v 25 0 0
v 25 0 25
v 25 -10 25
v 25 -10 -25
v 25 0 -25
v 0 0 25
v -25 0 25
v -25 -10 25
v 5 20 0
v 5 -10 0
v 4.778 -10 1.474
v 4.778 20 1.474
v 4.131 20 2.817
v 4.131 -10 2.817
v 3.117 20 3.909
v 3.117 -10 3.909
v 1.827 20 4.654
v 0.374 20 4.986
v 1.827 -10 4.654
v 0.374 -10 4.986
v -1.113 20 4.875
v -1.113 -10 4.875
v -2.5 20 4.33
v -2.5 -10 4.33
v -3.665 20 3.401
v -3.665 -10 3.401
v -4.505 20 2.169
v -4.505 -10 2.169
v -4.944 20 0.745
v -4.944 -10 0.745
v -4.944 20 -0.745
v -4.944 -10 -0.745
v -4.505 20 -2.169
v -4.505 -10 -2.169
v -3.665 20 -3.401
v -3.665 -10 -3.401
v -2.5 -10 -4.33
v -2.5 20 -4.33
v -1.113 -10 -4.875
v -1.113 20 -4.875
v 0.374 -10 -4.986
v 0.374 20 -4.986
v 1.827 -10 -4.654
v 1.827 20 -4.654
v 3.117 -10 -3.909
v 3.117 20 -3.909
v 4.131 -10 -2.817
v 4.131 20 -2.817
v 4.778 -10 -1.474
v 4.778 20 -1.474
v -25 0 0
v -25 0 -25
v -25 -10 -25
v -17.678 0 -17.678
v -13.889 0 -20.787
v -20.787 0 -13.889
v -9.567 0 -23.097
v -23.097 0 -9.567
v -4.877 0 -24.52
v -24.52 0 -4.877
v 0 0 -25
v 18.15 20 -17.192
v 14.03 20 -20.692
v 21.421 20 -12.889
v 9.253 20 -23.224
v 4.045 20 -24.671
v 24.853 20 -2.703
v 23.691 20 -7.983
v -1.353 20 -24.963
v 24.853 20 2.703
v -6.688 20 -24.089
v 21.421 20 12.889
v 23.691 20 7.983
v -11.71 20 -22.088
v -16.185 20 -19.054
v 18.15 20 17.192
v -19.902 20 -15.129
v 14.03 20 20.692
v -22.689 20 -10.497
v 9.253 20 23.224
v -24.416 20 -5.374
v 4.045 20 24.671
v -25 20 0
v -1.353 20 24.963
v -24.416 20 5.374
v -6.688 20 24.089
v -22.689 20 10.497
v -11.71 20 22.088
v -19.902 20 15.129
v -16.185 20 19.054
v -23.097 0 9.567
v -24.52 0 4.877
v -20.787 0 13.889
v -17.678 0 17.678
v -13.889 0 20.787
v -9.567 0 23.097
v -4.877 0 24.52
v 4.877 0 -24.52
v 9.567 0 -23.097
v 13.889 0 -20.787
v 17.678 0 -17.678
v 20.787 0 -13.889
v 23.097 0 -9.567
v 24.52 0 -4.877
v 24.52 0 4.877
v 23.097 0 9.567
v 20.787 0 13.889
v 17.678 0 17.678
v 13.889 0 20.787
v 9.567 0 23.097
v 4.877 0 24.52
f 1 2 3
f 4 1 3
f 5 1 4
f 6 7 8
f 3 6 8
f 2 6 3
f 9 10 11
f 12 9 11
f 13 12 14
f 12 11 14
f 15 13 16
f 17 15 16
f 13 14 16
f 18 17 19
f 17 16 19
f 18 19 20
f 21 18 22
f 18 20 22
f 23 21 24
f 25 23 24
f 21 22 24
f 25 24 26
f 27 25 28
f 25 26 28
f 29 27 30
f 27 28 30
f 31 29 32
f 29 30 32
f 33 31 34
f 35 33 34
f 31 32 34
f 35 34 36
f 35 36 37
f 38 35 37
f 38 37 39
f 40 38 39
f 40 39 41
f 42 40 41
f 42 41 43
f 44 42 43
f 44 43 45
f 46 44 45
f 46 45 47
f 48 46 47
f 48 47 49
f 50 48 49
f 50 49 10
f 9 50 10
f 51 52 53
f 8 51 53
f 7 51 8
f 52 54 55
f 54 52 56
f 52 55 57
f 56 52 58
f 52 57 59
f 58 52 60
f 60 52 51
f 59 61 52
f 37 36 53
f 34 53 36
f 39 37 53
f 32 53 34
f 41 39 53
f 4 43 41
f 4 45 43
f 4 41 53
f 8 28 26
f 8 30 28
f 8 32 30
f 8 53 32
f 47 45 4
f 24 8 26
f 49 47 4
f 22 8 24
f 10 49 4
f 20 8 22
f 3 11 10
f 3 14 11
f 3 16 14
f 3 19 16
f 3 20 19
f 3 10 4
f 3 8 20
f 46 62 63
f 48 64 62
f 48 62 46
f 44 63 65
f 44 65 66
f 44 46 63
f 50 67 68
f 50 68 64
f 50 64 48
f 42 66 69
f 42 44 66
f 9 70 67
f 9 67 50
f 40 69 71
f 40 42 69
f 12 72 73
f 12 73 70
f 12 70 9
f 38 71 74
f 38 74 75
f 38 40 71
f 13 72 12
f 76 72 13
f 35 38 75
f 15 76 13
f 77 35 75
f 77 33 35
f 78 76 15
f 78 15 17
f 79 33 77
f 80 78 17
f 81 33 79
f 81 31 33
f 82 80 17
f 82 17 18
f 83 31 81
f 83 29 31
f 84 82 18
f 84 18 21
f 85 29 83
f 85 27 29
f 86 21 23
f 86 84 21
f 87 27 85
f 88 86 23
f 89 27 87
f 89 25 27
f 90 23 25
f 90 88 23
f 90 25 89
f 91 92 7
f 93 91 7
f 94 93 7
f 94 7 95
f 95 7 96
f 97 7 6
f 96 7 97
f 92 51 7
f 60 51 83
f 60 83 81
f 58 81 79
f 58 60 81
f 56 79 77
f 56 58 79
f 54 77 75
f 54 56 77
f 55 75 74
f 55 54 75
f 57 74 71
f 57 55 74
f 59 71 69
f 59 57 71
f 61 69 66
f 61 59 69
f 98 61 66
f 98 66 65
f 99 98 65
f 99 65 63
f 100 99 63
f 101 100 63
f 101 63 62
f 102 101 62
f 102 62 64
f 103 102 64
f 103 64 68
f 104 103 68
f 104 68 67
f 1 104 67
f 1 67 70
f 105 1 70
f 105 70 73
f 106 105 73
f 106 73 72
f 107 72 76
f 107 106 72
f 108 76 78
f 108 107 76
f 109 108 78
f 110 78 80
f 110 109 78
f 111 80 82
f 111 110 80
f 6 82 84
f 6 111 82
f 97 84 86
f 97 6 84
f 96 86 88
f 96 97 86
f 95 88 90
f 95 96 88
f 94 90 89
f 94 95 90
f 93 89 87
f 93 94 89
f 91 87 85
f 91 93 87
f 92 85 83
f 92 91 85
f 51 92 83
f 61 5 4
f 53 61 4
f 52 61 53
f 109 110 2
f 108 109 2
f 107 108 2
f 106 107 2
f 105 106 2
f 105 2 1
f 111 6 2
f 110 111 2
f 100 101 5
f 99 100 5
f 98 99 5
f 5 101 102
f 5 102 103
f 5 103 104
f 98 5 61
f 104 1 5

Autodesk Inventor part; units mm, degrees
ref_plane "YZ Plane" through (0, 0, 0) normal (1, 0, 0) x (0, 1, 0)
ref_plane "XZ Plane" through (0, 0, 0) normal (0, 1, 0) x (-1, 0, 0)
ref_plane "XY Plane" through (0, 0, 0) normal (0, 0, 1) x (1, 0, 0)
sketch "Skizze1" plane through (0, 0, 0) normal (0, 1, 0) x (-1, 0, 0)
  circle A0 centre (0, 0) radius 25
  dimension "d0" = 50
extrude "Extrusion1" add sketch "Skizze1" along normal blind 20
sketch "Skizze2" plane through (0, 0, 0) normal (0, -1, 0) x (1, 0, 0)
  line L0 (-25, 25) -> (25, 25)
  line L1 (25, 25) -> (25, -25)
  line L2 (25, -25) -> (-25, -25)
  line L3 (-25, -25) -> (-25, 25)
  circle A0 centre (0, 0) radius 25 projected
extrude "Extrusion2" add sketch "Skizze2" along normal blind 10
sketch "Skizze3" plane through (0, -10, 0) normal (0, -1, 0) x (1, 0, 0)
  circle A0 centre (0, 0) radius 5
  dimension "d5" = 10
extrude "Extrusion3" cut sketch "Skizze3" against normal up to next
properties part number "2ExtrusionenMitLoch"
